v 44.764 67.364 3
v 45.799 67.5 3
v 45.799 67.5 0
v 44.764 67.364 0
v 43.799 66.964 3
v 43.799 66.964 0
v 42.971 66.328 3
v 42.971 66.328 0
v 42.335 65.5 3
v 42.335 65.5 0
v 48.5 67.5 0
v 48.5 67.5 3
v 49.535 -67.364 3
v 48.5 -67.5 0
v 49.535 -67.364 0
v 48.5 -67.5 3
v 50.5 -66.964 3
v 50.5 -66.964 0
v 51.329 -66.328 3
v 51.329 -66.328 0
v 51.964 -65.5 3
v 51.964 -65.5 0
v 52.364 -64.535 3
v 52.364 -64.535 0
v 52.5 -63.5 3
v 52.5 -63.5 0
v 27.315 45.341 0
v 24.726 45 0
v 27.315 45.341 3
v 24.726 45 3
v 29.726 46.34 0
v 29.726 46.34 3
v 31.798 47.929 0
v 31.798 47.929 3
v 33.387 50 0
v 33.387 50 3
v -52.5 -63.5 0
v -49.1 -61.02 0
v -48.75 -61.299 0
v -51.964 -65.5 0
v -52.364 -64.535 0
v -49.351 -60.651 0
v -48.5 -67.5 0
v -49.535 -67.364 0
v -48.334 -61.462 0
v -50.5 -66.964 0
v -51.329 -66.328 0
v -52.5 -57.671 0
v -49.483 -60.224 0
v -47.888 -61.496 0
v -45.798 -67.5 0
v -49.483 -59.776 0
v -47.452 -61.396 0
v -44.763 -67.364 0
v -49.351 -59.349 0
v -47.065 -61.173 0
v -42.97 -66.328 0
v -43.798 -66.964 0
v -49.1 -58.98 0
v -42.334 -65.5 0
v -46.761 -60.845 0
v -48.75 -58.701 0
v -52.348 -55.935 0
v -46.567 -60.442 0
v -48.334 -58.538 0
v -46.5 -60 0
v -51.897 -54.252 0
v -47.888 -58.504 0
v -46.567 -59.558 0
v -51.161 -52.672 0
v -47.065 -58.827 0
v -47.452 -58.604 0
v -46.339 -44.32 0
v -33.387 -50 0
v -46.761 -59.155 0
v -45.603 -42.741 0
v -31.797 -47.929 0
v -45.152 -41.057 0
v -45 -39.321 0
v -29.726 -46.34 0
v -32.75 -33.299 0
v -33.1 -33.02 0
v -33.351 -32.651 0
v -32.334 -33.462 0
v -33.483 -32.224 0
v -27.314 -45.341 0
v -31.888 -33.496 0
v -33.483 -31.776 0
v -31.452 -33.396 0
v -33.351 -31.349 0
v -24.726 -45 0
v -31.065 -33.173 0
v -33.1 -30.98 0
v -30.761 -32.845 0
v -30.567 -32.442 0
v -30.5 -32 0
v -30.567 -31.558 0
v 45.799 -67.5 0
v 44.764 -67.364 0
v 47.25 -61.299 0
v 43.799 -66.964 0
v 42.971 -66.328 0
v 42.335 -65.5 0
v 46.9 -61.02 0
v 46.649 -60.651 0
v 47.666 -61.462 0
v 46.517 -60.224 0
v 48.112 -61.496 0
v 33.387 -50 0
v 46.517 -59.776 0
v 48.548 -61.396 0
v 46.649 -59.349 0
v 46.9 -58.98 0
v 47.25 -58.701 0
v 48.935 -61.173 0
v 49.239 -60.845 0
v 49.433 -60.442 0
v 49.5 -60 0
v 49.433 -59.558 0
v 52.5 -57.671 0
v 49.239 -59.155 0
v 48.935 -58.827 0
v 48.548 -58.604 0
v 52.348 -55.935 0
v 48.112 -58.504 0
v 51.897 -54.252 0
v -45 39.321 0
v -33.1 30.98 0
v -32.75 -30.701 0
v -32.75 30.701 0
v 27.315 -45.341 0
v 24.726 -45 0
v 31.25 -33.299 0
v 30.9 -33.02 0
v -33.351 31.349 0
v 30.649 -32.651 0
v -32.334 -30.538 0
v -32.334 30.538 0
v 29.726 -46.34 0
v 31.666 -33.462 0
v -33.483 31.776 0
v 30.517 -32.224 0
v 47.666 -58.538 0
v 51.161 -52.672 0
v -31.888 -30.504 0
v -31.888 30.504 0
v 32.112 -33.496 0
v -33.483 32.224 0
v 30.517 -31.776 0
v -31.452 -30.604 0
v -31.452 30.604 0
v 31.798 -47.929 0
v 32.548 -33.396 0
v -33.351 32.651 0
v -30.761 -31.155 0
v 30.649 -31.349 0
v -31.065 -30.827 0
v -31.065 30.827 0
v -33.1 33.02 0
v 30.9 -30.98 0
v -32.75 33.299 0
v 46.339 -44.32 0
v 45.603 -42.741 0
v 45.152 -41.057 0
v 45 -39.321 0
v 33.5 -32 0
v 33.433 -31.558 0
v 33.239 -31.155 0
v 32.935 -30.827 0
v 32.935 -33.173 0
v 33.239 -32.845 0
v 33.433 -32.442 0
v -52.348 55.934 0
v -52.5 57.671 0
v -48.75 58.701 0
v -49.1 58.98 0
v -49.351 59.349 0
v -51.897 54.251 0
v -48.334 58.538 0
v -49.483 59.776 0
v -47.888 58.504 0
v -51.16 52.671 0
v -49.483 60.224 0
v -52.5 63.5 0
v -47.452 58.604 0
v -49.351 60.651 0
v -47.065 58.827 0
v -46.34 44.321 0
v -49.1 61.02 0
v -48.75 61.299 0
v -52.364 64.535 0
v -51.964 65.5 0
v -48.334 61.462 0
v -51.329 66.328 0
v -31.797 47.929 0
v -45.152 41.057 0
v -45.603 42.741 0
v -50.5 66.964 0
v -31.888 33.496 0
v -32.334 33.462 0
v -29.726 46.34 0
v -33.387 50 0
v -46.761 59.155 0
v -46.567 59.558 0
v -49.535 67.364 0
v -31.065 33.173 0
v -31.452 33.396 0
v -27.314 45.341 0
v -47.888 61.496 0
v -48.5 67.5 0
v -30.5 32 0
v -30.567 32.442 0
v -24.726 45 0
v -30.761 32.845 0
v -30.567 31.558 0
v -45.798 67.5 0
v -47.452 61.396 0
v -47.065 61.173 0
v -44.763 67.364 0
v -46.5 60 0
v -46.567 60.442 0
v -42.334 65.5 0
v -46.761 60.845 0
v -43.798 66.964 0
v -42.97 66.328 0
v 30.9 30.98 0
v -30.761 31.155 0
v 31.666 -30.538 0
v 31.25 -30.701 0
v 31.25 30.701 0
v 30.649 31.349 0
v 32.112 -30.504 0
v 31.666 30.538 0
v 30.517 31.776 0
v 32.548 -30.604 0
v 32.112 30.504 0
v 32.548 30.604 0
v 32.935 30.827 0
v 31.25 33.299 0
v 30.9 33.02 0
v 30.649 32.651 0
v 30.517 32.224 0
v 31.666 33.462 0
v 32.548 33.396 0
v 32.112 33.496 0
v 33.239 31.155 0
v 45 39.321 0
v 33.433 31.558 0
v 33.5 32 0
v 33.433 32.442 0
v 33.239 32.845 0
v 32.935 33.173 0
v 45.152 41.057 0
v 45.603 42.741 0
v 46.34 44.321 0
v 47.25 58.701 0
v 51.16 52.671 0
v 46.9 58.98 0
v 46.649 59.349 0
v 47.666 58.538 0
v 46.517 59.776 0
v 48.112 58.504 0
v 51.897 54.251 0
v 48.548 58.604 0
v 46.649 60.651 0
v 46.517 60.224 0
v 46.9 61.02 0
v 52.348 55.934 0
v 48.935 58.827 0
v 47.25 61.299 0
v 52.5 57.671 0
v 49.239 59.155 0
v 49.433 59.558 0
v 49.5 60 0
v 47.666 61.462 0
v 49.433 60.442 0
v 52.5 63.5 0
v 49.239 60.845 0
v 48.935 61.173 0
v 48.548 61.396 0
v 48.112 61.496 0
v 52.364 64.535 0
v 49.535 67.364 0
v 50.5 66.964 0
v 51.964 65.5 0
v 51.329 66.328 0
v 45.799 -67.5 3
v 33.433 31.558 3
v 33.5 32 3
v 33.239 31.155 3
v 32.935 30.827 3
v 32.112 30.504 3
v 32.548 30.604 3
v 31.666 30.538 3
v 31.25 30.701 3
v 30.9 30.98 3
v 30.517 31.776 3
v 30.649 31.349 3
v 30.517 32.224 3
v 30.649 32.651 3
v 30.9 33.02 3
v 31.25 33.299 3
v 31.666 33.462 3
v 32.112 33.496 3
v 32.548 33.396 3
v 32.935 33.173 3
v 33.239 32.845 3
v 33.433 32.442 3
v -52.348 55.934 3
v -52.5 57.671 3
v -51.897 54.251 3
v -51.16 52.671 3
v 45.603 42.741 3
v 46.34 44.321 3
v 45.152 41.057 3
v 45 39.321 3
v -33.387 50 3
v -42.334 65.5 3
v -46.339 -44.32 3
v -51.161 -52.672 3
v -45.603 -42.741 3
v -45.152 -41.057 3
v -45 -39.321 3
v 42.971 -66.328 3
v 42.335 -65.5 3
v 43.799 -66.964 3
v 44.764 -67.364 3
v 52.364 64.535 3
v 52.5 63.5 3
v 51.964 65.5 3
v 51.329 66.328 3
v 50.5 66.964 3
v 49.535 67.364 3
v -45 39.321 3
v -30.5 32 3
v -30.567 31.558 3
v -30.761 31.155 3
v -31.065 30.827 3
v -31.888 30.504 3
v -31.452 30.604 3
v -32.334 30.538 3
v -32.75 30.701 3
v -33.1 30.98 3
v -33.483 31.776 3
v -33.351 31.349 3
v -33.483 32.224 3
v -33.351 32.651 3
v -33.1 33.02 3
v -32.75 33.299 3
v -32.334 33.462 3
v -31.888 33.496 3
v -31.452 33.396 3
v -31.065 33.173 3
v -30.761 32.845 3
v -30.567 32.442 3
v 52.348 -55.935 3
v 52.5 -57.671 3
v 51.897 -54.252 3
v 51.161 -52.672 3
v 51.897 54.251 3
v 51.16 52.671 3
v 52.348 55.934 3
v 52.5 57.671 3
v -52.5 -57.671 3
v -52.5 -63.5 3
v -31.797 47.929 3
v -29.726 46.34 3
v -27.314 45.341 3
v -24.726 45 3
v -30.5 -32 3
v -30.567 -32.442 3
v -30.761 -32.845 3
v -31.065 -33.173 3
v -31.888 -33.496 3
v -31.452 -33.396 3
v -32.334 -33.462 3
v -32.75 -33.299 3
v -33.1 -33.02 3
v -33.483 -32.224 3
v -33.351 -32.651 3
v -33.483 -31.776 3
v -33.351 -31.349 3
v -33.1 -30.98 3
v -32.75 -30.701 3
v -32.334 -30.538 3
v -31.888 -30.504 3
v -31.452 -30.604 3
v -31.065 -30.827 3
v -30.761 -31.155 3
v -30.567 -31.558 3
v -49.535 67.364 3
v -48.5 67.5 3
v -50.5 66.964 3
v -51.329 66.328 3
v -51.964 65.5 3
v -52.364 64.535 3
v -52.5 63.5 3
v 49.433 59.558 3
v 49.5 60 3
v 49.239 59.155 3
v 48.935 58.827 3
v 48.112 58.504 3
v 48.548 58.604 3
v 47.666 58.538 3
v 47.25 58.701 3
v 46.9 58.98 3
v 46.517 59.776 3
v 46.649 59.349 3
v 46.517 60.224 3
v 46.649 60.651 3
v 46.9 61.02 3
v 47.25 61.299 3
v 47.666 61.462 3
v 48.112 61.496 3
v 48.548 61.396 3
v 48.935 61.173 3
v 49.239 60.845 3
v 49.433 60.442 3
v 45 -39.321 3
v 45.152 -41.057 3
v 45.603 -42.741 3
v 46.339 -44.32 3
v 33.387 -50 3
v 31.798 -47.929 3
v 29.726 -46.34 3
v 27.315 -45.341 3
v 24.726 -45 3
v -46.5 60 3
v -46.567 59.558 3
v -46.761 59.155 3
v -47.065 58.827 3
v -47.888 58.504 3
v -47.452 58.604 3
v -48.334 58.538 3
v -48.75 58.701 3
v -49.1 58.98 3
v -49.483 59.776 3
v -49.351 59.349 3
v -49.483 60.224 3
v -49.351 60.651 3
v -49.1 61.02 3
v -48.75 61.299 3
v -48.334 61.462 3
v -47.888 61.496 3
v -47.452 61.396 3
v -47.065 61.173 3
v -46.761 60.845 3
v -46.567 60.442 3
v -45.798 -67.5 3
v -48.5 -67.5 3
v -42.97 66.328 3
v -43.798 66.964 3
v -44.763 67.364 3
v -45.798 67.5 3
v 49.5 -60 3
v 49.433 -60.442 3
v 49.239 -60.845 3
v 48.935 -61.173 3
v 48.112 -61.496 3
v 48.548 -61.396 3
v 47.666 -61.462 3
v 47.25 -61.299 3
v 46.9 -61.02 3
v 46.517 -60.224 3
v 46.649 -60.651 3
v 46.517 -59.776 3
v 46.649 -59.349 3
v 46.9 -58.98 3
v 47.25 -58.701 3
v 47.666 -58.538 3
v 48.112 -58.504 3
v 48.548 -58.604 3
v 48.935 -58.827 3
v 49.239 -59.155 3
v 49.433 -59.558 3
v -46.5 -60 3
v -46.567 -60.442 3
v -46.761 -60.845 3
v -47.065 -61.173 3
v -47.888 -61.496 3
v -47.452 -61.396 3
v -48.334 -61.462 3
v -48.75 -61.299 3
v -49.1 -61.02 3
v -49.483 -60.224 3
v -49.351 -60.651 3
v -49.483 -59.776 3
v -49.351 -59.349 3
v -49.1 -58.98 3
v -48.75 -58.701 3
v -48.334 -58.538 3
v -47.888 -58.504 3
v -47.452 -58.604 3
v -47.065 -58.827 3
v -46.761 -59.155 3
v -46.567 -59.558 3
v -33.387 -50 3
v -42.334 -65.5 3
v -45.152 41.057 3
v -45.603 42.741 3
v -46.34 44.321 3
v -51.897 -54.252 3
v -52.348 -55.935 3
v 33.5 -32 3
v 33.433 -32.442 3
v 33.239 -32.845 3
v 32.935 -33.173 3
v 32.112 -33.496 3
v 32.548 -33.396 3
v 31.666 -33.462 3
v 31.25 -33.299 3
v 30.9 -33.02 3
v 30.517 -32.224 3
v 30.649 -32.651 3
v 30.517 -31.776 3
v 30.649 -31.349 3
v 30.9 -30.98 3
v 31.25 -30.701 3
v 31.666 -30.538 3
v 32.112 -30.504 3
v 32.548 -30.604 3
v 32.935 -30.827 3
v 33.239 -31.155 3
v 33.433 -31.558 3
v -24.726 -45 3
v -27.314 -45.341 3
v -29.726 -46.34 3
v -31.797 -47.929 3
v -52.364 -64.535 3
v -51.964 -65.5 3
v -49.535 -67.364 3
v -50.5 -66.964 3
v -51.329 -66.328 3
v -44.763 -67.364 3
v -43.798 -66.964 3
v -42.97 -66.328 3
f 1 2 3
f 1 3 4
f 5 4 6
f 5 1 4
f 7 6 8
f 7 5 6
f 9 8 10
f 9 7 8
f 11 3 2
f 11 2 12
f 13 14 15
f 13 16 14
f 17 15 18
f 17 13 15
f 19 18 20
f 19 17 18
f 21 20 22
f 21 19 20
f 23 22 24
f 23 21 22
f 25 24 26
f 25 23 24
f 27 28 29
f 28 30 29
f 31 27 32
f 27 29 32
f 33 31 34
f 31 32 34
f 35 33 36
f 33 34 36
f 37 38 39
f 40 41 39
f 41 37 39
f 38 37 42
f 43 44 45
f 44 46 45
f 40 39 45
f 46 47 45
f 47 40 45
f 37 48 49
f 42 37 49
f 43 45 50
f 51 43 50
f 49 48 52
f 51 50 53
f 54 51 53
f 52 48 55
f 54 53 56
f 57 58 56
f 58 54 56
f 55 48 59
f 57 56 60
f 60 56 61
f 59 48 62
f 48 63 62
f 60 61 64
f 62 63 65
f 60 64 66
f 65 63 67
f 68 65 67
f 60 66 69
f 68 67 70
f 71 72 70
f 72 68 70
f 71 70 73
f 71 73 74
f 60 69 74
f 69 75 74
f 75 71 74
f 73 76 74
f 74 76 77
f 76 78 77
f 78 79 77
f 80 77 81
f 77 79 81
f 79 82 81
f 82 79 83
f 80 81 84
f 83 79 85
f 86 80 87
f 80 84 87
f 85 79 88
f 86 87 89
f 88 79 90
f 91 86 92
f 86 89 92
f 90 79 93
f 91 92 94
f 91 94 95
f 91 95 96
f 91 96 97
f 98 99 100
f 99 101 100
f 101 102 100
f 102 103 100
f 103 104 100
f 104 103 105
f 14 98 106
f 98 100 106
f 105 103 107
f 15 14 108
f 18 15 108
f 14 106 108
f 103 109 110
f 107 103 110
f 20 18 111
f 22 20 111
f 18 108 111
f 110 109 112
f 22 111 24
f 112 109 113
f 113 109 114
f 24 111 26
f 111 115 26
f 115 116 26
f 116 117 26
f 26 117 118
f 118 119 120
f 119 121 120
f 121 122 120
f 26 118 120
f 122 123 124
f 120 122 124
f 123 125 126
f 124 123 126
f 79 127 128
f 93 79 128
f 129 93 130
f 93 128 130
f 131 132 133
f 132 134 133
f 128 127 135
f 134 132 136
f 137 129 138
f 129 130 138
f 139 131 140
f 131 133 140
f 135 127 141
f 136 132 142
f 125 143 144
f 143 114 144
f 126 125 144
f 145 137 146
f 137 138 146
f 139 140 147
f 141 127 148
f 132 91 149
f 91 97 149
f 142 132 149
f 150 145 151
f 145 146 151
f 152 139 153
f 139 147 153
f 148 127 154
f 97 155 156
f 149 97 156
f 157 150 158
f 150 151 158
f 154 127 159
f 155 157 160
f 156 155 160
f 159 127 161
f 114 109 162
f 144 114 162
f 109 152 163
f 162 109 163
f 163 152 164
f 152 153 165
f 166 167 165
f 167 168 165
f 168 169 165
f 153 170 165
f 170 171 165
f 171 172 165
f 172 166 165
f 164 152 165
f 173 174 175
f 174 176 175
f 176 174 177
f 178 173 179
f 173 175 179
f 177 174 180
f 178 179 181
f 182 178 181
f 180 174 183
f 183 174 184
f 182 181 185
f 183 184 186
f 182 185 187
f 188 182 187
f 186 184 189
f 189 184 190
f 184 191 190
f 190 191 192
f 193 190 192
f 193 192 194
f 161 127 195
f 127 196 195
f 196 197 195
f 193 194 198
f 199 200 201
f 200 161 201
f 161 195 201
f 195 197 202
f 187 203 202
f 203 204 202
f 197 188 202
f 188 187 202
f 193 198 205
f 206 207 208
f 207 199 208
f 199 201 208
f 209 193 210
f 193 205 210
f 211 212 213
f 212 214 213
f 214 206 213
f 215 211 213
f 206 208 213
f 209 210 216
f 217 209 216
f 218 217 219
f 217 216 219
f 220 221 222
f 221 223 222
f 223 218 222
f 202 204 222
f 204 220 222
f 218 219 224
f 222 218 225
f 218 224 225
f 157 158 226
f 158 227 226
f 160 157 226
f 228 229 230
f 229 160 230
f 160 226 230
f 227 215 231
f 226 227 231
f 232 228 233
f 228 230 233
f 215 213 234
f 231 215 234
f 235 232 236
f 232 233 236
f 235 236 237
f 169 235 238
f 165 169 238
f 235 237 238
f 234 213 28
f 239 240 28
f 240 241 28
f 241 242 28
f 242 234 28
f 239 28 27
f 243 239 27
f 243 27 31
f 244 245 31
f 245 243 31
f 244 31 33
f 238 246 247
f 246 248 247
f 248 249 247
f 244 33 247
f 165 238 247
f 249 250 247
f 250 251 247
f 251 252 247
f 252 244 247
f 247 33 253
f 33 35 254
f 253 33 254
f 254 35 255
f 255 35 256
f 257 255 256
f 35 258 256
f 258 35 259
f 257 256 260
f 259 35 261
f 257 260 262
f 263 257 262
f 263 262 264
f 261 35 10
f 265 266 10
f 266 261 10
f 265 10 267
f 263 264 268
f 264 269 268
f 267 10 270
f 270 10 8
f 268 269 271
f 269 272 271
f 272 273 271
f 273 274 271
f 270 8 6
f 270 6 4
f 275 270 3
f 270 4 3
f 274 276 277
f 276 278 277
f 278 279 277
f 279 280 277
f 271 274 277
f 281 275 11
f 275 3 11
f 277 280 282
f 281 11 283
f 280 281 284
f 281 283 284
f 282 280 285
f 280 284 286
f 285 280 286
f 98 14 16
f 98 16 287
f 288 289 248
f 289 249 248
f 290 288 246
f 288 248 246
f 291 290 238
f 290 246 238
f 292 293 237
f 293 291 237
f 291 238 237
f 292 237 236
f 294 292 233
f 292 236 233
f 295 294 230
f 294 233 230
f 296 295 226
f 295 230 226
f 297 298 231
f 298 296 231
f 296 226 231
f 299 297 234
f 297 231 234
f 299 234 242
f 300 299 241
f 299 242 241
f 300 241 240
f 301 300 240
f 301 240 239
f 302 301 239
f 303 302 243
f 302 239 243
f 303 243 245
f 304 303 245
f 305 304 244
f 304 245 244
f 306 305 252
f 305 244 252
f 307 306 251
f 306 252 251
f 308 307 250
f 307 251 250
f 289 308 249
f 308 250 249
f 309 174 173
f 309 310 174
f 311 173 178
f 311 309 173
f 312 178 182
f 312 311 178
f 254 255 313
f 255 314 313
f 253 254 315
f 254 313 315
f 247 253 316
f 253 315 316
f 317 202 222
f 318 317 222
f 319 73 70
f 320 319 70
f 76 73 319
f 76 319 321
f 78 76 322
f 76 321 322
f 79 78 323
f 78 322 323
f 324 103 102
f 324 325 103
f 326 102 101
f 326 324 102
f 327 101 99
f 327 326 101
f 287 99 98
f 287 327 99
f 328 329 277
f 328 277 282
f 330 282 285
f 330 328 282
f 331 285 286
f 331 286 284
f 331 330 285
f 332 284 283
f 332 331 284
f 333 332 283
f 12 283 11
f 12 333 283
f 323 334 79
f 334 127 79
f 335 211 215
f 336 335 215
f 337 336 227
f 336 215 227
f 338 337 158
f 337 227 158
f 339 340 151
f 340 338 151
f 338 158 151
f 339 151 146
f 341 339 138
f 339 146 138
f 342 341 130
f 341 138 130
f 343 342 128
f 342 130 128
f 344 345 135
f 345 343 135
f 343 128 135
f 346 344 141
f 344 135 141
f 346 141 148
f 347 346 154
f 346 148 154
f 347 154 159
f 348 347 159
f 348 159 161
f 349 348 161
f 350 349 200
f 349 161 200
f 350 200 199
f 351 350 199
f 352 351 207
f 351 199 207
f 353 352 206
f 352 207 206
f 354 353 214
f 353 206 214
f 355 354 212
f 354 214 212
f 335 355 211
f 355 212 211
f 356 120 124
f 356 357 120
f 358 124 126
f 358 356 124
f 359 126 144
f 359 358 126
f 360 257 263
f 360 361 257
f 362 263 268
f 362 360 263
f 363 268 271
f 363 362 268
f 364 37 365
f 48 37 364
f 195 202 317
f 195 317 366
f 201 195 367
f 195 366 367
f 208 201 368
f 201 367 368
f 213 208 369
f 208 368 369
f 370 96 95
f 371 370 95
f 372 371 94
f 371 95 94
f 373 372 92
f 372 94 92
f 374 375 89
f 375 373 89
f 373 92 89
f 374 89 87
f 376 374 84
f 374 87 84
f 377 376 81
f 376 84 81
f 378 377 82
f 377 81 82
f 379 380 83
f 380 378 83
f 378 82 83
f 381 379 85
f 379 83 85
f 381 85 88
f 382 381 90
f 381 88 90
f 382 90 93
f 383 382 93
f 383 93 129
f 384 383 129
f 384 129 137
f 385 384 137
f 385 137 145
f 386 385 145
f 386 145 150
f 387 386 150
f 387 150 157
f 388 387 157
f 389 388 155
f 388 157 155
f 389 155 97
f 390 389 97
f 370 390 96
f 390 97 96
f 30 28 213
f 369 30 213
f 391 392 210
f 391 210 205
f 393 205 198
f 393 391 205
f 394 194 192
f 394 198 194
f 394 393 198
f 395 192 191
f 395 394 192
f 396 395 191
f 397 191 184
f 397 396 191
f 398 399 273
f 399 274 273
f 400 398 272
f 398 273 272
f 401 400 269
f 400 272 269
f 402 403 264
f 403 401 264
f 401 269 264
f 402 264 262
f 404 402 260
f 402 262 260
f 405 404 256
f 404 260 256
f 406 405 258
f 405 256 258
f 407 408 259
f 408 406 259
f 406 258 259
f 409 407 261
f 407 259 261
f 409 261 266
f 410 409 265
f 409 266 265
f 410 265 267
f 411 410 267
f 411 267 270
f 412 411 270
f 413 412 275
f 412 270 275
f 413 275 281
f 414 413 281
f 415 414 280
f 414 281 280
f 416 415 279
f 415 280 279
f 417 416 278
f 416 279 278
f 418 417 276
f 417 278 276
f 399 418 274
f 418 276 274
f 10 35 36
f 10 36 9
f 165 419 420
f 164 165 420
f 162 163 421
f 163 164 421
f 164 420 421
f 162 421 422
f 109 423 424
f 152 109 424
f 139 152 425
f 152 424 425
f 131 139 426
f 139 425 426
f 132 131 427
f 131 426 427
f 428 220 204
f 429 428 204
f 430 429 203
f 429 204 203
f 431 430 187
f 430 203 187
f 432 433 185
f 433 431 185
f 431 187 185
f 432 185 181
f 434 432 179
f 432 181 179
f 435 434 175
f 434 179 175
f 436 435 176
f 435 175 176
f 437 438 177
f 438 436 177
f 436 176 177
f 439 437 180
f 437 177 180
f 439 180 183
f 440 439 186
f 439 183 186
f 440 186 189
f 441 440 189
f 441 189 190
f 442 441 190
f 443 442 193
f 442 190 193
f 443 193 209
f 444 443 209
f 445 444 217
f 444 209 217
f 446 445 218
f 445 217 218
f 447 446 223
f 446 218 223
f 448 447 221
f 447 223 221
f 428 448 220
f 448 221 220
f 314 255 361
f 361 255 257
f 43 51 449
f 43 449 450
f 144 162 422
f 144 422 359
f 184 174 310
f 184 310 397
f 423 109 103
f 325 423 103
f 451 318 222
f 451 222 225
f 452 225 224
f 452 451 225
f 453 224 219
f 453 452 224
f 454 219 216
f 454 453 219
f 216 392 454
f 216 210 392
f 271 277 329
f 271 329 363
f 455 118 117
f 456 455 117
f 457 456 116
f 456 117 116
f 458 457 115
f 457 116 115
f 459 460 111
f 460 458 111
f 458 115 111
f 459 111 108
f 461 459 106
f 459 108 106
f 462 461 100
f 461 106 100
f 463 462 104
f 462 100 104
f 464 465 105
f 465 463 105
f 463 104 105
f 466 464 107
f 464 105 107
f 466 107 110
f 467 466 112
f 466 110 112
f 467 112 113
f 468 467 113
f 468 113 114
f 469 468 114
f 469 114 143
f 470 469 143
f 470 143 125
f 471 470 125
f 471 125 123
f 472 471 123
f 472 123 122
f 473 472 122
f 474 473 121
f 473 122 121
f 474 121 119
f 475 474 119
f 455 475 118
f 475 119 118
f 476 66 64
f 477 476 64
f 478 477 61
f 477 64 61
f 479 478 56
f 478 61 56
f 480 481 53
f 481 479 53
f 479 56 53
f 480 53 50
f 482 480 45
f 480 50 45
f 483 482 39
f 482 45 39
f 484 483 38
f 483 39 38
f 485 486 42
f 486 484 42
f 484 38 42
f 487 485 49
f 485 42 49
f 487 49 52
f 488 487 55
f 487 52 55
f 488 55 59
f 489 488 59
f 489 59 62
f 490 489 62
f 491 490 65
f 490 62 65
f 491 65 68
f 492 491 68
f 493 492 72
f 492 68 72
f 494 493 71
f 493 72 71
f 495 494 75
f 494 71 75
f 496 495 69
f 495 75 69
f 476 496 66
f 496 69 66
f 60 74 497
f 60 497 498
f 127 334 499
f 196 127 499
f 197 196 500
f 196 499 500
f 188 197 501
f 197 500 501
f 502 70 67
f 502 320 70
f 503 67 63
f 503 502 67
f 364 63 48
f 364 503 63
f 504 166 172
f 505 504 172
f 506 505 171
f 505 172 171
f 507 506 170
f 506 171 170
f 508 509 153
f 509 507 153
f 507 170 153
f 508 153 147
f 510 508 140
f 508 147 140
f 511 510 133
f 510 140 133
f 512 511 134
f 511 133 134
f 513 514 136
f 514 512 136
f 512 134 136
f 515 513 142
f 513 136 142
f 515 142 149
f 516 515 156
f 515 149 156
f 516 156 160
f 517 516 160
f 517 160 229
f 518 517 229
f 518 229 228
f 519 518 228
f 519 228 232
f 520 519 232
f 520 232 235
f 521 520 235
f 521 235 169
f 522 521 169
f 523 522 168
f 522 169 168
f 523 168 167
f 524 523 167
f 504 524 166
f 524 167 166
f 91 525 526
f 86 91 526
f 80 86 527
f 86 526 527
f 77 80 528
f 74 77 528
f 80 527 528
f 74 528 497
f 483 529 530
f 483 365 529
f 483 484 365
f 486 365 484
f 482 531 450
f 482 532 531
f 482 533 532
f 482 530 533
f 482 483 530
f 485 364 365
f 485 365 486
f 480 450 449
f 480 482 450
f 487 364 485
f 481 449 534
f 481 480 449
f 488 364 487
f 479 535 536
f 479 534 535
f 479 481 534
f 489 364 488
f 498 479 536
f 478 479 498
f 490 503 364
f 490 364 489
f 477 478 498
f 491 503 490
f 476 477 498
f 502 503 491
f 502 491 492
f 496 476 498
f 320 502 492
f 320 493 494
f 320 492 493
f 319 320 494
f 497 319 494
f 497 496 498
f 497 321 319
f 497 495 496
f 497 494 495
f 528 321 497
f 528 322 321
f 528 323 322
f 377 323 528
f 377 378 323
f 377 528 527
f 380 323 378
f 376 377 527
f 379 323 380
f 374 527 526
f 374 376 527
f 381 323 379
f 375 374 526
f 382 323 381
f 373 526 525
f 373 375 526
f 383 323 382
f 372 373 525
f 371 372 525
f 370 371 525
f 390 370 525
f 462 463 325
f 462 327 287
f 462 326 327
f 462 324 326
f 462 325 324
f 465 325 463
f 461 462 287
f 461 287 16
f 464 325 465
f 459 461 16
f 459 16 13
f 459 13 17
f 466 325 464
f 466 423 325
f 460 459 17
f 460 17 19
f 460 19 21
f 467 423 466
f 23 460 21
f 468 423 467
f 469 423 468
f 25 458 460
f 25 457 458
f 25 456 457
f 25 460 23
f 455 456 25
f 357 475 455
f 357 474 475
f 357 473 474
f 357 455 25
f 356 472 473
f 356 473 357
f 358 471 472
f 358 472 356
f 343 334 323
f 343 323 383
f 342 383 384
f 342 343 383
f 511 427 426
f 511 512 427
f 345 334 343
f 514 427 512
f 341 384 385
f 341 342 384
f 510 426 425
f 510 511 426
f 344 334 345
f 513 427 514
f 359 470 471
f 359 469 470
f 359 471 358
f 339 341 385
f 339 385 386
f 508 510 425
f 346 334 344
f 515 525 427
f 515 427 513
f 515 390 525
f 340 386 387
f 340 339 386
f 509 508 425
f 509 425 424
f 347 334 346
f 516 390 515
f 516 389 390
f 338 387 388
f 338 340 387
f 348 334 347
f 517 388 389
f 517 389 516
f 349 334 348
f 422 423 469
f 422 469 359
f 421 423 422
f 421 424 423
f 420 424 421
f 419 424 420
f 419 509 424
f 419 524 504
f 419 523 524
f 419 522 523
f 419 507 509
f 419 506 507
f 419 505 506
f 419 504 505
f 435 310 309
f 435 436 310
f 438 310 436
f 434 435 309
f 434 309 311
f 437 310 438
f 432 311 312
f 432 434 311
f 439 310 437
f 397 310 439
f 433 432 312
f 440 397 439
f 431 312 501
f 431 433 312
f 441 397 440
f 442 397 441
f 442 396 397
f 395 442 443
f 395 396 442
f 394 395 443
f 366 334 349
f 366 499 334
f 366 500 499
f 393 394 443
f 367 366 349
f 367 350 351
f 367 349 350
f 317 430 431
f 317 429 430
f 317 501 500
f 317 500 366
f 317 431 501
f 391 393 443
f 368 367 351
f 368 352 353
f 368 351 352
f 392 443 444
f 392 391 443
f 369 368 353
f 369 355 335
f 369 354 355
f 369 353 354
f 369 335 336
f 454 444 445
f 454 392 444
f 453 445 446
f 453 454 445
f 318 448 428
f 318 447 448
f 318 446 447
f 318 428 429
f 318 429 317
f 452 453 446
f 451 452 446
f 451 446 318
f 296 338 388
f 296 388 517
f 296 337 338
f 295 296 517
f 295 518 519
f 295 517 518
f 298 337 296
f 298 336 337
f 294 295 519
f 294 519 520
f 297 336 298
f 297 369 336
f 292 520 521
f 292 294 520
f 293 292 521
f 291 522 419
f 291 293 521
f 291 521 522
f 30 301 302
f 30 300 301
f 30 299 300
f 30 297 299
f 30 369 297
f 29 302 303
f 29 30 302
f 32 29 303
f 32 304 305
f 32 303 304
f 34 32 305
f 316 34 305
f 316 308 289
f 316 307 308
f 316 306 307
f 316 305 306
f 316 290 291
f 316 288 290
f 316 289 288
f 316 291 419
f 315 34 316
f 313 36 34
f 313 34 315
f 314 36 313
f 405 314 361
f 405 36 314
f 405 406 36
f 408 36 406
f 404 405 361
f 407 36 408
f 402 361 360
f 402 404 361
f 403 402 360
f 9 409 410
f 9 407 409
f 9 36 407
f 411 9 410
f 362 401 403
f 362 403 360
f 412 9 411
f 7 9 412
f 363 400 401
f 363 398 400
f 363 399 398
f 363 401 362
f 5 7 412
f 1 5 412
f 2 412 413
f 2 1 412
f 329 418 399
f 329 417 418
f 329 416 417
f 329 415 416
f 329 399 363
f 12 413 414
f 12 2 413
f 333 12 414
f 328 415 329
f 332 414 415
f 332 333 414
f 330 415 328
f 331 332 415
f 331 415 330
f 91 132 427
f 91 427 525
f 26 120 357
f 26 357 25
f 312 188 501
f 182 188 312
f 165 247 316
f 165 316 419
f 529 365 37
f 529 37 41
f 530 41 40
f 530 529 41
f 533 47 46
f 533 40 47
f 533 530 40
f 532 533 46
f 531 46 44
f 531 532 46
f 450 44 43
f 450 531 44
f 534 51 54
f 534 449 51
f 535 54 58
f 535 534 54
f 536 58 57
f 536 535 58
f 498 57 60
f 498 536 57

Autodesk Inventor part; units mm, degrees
ref_plane "YZ Plane" through (0, 0, 0) normal (1, 0, 0) x (0, 1, 0)
ref_plane "XZ Plane" through (0, 0, 0) normal (0, 1, 0) x (-1, 0, 0)
ref_plane "XY Plane" through (0, 0, 0) normal (0, 0, 1) x (1, 0, 0)
sketch "Sketch3" plane through (0, 0, 0) normal (0, 0, 1) x (1, 0, 0)
  line L0 (52.5001, -67.5) -> (-52.5001, -67.5)
  line L1 (-52.5001, -67.5) -> (-52.5001, 67.5)
  line L2 (-52.5001, 67.5) -> (52.5001, 67.5)
  line L3 (52.5001, 67.5) -> (52.5001, -67.5)
  circle A0 centre (32, 32) radius 1.5
  circle A1 centre (-32, 32) radius 1.5
  circle A2 centre (-32, -32) radius 1.5
  circle A3 centre (32, -32) radius 1.5
  circle A4 centre (48, 60) radius 1.5
  circle A5 centre (-48, 60) radius 1.5
  circle A6 centre (-48, -60) radius 1.5
  circle A7 centre (48, -60) radius 1.5
  line L4 (30.5, 0) -> (-30.5, 0)
  line L5 (30.5, 45) -> (-30.5, 45)
  line L6 (30.5, 45) -> (43.4898, 67.5)
  line L7 (-30.5, 45) -> (-43.4888, 67.5)
  line L8 (30.5, -45) -> (-30.5, -45)
  line L9 (30.5, -45) -> (43.4898, -67.5)
  line L10 (-30.5, -45) -> (-43.4888, -67.5)
  line L11 (0, 42.0002) -> (0, -42)
  line L12 (45, 42.0002) -> (45, -42)
  line L13 (45, 42.0002) -> (52.5001, 54.9914)
  line L14 (45, -42) -> (52.5001, -54.9922)
  line L15 (-45, 42.0002) -> (-45, -42)
  line L16 (-45, 42.0002) -> (-52.5001, 54.9914)
  line L17 (-45, -42) -> (-52.5001, -54.9922)
extrude "Extrusion2" add sketch "Sketch3" along normal blind 3
fillet "Fillet2" radius 4 4 edges at (-52.5001, 67.5, 1.5) (52.5001, 67.5, 1.5) (52.5001, -67.5, 1.5) (-52.5001, -67.5, 1.5)
extrude "Extrusion3" cut sketch "Sketch3" along normal blind 10 contours L0 L10 L8 L9 | L14 L12 L13 L3 | L1 L16 L15 L17 | L6 L5 L7 L2
fillet "Fillet3" radius 10 8 edges at (30.5, 45, 1.5) (-30.5, 45, 1.5) (30.5, -45, 1.5) (-30.5, -45, 1.5) (-52.5001, 54.9914, 1.5) (52.5001, -54.9922, 1.5) (-52.5001, -54.9922, 1.5) (52.5001, 54.9914, 1.5)
fillet "Fillet4" radius 10 4 edges at (45, 42.0002, 1.5) (45, -42, 1.5) (-45, -42, 1.5) (-45, 42.0002, 1.5)
fillet "Fillet5" radius 4 4 edges at (43.4898, 67.5, 1.5) (-43.4888, 67.5, 1.5) (43.4898, -67.5, 1.5) (-43.4888, -67.5, 1.5)
properties part number "GPS - mount v2"
